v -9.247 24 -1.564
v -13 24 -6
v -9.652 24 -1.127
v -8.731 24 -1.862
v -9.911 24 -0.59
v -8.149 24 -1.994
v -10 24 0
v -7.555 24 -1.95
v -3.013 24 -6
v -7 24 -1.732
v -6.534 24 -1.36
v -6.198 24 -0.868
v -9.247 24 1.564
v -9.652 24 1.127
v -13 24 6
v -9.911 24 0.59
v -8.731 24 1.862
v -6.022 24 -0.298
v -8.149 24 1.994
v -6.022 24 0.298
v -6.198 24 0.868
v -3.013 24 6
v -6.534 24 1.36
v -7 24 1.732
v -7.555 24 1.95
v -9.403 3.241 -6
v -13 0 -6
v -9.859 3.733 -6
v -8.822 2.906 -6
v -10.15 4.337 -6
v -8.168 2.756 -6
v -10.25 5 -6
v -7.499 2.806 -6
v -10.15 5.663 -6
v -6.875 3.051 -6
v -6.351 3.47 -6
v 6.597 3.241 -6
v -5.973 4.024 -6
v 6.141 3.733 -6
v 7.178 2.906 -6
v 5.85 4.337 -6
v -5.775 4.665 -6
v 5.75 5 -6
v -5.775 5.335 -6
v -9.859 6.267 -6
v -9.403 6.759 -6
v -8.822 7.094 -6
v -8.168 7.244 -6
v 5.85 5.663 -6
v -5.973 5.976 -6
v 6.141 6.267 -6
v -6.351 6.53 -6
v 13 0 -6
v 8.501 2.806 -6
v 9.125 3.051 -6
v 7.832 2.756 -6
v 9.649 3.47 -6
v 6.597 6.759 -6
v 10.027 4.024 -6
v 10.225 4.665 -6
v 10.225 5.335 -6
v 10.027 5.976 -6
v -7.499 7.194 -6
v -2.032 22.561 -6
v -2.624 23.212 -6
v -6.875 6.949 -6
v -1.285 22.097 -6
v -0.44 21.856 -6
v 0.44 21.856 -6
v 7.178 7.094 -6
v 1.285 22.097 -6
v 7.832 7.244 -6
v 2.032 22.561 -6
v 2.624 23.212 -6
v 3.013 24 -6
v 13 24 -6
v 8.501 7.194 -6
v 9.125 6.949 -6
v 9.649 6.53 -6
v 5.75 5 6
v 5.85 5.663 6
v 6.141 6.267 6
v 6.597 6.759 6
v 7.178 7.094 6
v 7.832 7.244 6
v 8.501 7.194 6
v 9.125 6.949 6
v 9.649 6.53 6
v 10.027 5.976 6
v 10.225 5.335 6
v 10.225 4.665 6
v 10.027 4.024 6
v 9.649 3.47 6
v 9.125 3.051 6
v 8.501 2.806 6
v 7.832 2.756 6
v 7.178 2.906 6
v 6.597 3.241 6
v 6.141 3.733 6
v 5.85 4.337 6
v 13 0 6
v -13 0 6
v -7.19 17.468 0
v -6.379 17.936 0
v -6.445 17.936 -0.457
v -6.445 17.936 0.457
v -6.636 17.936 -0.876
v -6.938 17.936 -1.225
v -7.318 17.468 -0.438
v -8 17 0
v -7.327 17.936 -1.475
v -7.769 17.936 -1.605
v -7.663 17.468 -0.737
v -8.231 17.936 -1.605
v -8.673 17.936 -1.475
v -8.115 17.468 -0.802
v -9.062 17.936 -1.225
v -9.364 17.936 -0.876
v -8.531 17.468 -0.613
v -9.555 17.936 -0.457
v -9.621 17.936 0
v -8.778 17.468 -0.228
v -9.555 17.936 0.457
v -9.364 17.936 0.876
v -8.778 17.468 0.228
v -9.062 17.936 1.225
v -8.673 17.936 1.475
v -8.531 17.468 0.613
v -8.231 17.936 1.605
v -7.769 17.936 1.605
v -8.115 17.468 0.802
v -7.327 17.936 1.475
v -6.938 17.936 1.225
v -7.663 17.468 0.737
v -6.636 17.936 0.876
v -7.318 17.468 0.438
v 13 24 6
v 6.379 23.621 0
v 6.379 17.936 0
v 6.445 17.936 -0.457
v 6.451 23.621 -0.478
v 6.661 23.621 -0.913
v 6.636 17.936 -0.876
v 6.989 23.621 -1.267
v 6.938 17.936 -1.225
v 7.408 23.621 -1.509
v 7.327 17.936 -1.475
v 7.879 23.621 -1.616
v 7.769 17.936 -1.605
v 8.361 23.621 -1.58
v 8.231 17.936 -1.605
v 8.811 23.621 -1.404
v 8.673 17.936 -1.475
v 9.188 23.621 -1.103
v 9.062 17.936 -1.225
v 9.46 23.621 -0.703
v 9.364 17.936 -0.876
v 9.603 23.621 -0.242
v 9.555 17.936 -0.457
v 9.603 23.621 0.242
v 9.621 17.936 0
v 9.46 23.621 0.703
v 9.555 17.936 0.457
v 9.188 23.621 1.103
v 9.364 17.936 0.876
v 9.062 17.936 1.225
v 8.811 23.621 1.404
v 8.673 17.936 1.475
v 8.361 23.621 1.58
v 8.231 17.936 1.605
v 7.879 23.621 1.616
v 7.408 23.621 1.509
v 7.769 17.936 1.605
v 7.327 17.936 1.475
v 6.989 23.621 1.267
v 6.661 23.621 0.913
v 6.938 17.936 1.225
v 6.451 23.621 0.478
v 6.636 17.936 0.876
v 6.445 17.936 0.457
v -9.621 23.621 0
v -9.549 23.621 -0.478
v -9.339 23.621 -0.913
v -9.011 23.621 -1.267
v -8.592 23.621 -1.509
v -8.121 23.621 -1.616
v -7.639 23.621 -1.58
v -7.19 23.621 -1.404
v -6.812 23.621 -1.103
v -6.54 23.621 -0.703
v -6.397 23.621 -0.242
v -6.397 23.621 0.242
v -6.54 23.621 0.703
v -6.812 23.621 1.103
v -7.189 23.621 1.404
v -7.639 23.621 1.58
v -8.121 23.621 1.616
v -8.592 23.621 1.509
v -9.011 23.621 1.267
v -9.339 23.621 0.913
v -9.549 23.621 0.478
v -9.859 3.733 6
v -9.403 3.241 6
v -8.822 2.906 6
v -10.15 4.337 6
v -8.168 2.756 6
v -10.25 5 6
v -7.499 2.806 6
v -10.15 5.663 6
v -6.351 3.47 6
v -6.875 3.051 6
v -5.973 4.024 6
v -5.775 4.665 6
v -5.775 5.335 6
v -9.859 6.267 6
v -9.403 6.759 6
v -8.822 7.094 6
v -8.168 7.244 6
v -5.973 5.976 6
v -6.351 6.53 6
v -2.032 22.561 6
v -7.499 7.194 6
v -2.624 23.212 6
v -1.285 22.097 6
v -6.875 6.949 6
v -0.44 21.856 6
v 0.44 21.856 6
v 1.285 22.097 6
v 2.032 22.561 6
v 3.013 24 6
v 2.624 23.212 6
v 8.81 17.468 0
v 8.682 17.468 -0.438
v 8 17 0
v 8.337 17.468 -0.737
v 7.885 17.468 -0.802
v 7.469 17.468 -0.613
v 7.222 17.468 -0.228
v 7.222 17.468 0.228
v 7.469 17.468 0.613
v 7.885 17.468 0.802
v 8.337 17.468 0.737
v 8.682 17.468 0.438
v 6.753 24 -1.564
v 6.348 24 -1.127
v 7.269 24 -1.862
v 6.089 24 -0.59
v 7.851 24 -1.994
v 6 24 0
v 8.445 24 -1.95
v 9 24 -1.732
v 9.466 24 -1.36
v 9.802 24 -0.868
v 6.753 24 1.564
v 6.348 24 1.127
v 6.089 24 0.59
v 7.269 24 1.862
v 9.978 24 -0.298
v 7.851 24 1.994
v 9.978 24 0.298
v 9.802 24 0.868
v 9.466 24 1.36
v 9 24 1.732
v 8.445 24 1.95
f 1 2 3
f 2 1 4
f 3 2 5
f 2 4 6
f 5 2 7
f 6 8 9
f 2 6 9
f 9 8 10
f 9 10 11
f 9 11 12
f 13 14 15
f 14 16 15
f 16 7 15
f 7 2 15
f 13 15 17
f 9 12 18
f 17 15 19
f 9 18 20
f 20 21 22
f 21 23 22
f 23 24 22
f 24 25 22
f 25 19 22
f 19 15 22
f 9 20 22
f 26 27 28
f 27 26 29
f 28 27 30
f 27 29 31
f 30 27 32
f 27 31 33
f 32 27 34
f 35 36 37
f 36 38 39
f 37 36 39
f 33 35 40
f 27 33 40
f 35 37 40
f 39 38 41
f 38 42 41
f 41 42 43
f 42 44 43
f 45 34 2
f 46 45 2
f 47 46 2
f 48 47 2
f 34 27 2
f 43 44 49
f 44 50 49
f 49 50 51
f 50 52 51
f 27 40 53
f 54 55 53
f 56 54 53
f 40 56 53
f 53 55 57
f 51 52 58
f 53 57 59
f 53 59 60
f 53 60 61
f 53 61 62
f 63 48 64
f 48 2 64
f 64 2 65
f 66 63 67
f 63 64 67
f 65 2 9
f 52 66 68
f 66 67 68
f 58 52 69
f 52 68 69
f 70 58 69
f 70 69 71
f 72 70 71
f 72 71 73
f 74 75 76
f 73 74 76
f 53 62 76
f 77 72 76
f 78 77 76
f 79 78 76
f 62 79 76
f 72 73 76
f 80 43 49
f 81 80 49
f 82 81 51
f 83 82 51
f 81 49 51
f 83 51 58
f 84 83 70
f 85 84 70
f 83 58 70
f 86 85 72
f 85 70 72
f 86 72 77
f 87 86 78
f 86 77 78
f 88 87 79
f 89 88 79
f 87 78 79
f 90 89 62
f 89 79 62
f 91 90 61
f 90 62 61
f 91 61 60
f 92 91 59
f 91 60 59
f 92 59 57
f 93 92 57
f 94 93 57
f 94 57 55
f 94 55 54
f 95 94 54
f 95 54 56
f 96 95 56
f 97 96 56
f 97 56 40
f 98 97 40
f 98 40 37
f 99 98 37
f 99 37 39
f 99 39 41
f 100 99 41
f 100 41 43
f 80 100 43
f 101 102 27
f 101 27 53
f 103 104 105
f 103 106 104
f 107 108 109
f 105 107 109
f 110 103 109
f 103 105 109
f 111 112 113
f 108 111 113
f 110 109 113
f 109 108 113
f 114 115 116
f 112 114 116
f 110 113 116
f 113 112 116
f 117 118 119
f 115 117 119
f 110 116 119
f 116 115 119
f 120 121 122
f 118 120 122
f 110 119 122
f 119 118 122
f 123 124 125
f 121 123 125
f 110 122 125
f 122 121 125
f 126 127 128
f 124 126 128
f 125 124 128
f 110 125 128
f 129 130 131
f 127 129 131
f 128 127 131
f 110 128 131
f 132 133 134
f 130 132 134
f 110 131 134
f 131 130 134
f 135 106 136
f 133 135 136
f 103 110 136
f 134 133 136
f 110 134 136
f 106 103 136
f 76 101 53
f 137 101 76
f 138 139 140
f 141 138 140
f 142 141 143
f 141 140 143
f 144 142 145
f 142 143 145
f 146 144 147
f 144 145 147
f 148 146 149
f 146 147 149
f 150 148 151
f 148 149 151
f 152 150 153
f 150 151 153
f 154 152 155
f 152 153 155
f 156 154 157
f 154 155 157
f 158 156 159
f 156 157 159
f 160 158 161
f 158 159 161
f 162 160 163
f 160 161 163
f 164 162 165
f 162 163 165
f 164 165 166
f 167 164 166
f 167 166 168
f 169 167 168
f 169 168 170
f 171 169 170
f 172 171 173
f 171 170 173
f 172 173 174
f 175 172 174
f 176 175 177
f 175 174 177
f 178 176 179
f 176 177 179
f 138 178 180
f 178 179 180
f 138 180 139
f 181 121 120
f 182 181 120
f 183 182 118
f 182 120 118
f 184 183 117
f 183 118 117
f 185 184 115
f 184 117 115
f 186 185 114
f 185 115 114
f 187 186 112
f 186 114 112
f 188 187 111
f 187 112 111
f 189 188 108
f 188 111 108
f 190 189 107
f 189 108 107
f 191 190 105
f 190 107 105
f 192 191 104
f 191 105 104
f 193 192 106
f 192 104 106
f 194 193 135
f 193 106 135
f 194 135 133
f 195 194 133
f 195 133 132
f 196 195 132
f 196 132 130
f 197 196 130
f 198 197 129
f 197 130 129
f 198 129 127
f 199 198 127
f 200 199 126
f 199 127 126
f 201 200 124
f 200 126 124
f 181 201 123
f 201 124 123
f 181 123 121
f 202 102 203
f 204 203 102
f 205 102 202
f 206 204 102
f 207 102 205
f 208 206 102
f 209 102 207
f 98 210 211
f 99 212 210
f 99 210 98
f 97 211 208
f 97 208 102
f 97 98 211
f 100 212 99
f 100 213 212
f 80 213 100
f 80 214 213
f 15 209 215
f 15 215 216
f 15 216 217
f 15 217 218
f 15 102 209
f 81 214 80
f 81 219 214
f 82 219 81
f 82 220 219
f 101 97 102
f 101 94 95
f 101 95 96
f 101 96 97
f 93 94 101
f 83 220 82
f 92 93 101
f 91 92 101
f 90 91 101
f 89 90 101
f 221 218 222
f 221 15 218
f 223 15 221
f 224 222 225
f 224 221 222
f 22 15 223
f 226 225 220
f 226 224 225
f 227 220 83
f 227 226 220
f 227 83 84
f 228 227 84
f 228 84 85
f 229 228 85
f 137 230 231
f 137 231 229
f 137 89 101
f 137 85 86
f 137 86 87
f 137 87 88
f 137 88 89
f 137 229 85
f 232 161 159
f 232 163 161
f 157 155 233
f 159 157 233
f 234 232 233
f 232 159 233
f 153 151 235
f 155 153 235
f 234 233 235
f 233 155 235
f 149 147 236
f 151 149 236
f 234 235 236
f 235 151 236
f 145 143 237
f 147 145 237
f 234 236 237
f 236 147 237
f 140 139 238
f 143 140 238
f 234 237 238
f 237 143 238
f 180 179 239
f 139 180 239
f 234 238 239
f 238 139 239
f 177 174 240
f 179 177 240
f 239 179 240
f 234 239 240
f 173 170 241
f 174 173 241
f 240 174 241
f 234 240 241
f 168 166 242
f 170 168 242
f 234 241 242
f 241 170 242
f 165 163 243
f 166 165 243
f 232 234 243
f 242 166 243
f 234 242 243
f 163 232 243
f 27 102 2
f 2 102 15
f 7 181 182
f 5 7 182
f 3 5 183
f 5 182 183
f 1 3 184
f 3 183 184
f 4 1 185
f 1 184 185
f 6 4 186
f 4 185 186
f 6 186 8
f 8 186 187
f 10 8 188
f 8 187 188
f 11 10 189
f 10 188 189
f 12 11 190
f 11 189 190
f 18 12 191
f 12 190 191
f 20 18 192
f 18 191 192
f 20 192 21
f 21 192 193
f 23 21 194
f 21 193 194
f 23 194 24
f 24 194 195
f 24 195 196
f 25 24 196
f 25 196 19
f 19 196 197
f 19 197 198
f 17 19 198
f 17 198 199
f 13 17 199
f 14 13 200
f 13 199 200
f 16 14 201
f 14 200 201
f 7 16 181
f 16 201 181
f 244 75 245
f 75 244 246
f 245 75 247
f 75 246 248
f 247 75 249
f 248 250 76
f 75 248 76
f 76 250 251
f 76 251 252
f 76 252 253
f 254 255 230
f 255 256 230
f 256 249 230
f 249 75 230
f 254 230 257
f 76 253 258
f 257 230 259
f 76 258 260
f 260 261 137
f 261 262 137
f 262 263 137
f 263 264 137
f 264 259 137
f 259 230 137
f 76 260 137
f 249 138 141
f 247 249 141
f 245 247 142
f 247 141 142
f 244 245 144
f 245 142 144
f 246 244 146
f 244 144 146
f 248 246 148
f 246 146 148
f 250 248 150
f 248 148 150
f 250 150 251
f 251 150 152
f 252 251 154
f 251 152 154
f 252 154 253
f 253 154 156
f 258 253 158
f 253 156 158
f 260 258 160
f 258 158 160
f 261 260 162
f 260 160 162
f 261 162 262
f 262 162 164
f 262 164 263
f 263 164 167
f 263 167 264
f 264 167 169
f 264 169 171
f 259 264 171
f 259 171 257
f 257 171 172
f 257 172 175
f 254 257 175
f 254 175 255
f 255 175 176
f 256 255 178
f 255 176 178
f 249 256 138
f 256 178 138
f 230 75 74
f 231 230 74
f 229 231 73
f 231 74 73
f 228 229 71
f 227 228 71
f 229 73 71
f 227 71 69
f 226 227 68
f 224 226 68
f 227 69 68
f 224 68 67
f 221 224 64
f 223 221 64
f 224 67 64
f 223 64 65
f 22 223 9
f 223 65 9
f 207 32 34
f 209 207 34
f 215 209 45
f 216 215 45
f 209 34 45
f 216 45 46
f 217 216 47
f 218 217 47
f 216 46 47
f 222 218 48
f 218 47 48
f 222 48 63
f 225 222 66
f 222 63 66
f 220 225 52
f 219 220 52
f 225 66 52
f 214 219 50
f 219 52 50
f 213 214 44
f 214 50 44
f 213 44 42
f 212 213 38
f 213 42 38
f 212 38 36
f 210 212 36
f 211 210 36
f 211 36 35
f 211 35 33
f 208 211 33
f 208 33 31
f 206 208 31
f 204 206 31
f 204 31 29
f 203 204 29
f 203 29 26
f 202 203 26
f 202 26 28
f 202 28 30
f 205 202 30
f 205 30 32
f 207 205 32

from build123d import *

# Parameters (mm, degrees)
SKETCH1_W                  = 26
SKETCH1_H                  = 24
BOSS_EXTRUDE1_DEPTH        = 12
CUT_EXTRUDE1_DEPTH         = 30.816103032
M3_CLEARANCE_HOLE1_D       = 3.242
M3_CLEARANCE_HOLE1_DEPTH   = 6.064115214
M3_CLEARANCE_HOLE1_TIP     = 0.935884786
F_4_5_4_5_DIAMETER_HOLE1_D = 4.5
CHAMFER1_SIZE              = 0.379


with BuildPart() as part:
    # Sketch1 → Boss-Extrude1 (new body)
    with BuildSketch(Plane.XY.offset(6)):
        with Locations((0, 12)):
            Rectangle(SKETCH1_W, SKETCH1_H)
    extrude(amount=-BOSS_EXTRUDE1_DEPTH)

    # Sketch2 → Cut-Extrude1 (cut, through all)
    with BuildSketch(Plane(origin=(0, 0, -6), x_dir=(-1, 0, 0), z_dir=(0, 0, -1))):
        with BuildLine():
            Line((3.01340754, 24), (-3.01340754, 24))
            ThreePointArc((-3.01340754, 24), (0, 21.825), (3.01340754, 24))
        make_face()
    extrude(amount=-CUT_EXTRUDE1_DEPTH, mode=Mode.SUBTRACT)

    # M3 Clearance Hole1
    with Locations(Plane(origin=(0, 24, 0), x_dir=(1, 0, 0), z_dir=(0, 1, 0))):
        with Locations((8, 0), (-8, 0)):
            Hole(M3_CLEARANCE_HOLE1_D / 2, depth=M3_CLEARANCE_HOLE1_DEPTH)
            with Locations((0, 0, -(M3_CLEARANCE_HOLE1_DEPTH + M3_CLEARANCE_HOLE1_TIP / 2))):  # 120° drill point
                Cone(0, M3_CLEARANCE_HOLE1_D / 2, M3_CLEARANCE_HOLE1_TIP, mode=Mode.SUBTRACT)

    # Ø4.5 (4.5) Diameter Hole1 (through all)
    with Locations(Plane.XY.offset(6)):
        with Locations((8, 5), (-8, 5)):
            Hole(F_4_5_4_5_DIAMETER_HOLE1_D / 2)

    # Chamfer1
    chamfer1_edges = [part.edges().sort_by_distance(p)[0] for p in [
        (-6.379, 24, 0),
        (9.621, 24, 0),
    ]]
    chamfer(chamfer1_edges, length=CHAMFER1_SIZE)


solid = part.part
